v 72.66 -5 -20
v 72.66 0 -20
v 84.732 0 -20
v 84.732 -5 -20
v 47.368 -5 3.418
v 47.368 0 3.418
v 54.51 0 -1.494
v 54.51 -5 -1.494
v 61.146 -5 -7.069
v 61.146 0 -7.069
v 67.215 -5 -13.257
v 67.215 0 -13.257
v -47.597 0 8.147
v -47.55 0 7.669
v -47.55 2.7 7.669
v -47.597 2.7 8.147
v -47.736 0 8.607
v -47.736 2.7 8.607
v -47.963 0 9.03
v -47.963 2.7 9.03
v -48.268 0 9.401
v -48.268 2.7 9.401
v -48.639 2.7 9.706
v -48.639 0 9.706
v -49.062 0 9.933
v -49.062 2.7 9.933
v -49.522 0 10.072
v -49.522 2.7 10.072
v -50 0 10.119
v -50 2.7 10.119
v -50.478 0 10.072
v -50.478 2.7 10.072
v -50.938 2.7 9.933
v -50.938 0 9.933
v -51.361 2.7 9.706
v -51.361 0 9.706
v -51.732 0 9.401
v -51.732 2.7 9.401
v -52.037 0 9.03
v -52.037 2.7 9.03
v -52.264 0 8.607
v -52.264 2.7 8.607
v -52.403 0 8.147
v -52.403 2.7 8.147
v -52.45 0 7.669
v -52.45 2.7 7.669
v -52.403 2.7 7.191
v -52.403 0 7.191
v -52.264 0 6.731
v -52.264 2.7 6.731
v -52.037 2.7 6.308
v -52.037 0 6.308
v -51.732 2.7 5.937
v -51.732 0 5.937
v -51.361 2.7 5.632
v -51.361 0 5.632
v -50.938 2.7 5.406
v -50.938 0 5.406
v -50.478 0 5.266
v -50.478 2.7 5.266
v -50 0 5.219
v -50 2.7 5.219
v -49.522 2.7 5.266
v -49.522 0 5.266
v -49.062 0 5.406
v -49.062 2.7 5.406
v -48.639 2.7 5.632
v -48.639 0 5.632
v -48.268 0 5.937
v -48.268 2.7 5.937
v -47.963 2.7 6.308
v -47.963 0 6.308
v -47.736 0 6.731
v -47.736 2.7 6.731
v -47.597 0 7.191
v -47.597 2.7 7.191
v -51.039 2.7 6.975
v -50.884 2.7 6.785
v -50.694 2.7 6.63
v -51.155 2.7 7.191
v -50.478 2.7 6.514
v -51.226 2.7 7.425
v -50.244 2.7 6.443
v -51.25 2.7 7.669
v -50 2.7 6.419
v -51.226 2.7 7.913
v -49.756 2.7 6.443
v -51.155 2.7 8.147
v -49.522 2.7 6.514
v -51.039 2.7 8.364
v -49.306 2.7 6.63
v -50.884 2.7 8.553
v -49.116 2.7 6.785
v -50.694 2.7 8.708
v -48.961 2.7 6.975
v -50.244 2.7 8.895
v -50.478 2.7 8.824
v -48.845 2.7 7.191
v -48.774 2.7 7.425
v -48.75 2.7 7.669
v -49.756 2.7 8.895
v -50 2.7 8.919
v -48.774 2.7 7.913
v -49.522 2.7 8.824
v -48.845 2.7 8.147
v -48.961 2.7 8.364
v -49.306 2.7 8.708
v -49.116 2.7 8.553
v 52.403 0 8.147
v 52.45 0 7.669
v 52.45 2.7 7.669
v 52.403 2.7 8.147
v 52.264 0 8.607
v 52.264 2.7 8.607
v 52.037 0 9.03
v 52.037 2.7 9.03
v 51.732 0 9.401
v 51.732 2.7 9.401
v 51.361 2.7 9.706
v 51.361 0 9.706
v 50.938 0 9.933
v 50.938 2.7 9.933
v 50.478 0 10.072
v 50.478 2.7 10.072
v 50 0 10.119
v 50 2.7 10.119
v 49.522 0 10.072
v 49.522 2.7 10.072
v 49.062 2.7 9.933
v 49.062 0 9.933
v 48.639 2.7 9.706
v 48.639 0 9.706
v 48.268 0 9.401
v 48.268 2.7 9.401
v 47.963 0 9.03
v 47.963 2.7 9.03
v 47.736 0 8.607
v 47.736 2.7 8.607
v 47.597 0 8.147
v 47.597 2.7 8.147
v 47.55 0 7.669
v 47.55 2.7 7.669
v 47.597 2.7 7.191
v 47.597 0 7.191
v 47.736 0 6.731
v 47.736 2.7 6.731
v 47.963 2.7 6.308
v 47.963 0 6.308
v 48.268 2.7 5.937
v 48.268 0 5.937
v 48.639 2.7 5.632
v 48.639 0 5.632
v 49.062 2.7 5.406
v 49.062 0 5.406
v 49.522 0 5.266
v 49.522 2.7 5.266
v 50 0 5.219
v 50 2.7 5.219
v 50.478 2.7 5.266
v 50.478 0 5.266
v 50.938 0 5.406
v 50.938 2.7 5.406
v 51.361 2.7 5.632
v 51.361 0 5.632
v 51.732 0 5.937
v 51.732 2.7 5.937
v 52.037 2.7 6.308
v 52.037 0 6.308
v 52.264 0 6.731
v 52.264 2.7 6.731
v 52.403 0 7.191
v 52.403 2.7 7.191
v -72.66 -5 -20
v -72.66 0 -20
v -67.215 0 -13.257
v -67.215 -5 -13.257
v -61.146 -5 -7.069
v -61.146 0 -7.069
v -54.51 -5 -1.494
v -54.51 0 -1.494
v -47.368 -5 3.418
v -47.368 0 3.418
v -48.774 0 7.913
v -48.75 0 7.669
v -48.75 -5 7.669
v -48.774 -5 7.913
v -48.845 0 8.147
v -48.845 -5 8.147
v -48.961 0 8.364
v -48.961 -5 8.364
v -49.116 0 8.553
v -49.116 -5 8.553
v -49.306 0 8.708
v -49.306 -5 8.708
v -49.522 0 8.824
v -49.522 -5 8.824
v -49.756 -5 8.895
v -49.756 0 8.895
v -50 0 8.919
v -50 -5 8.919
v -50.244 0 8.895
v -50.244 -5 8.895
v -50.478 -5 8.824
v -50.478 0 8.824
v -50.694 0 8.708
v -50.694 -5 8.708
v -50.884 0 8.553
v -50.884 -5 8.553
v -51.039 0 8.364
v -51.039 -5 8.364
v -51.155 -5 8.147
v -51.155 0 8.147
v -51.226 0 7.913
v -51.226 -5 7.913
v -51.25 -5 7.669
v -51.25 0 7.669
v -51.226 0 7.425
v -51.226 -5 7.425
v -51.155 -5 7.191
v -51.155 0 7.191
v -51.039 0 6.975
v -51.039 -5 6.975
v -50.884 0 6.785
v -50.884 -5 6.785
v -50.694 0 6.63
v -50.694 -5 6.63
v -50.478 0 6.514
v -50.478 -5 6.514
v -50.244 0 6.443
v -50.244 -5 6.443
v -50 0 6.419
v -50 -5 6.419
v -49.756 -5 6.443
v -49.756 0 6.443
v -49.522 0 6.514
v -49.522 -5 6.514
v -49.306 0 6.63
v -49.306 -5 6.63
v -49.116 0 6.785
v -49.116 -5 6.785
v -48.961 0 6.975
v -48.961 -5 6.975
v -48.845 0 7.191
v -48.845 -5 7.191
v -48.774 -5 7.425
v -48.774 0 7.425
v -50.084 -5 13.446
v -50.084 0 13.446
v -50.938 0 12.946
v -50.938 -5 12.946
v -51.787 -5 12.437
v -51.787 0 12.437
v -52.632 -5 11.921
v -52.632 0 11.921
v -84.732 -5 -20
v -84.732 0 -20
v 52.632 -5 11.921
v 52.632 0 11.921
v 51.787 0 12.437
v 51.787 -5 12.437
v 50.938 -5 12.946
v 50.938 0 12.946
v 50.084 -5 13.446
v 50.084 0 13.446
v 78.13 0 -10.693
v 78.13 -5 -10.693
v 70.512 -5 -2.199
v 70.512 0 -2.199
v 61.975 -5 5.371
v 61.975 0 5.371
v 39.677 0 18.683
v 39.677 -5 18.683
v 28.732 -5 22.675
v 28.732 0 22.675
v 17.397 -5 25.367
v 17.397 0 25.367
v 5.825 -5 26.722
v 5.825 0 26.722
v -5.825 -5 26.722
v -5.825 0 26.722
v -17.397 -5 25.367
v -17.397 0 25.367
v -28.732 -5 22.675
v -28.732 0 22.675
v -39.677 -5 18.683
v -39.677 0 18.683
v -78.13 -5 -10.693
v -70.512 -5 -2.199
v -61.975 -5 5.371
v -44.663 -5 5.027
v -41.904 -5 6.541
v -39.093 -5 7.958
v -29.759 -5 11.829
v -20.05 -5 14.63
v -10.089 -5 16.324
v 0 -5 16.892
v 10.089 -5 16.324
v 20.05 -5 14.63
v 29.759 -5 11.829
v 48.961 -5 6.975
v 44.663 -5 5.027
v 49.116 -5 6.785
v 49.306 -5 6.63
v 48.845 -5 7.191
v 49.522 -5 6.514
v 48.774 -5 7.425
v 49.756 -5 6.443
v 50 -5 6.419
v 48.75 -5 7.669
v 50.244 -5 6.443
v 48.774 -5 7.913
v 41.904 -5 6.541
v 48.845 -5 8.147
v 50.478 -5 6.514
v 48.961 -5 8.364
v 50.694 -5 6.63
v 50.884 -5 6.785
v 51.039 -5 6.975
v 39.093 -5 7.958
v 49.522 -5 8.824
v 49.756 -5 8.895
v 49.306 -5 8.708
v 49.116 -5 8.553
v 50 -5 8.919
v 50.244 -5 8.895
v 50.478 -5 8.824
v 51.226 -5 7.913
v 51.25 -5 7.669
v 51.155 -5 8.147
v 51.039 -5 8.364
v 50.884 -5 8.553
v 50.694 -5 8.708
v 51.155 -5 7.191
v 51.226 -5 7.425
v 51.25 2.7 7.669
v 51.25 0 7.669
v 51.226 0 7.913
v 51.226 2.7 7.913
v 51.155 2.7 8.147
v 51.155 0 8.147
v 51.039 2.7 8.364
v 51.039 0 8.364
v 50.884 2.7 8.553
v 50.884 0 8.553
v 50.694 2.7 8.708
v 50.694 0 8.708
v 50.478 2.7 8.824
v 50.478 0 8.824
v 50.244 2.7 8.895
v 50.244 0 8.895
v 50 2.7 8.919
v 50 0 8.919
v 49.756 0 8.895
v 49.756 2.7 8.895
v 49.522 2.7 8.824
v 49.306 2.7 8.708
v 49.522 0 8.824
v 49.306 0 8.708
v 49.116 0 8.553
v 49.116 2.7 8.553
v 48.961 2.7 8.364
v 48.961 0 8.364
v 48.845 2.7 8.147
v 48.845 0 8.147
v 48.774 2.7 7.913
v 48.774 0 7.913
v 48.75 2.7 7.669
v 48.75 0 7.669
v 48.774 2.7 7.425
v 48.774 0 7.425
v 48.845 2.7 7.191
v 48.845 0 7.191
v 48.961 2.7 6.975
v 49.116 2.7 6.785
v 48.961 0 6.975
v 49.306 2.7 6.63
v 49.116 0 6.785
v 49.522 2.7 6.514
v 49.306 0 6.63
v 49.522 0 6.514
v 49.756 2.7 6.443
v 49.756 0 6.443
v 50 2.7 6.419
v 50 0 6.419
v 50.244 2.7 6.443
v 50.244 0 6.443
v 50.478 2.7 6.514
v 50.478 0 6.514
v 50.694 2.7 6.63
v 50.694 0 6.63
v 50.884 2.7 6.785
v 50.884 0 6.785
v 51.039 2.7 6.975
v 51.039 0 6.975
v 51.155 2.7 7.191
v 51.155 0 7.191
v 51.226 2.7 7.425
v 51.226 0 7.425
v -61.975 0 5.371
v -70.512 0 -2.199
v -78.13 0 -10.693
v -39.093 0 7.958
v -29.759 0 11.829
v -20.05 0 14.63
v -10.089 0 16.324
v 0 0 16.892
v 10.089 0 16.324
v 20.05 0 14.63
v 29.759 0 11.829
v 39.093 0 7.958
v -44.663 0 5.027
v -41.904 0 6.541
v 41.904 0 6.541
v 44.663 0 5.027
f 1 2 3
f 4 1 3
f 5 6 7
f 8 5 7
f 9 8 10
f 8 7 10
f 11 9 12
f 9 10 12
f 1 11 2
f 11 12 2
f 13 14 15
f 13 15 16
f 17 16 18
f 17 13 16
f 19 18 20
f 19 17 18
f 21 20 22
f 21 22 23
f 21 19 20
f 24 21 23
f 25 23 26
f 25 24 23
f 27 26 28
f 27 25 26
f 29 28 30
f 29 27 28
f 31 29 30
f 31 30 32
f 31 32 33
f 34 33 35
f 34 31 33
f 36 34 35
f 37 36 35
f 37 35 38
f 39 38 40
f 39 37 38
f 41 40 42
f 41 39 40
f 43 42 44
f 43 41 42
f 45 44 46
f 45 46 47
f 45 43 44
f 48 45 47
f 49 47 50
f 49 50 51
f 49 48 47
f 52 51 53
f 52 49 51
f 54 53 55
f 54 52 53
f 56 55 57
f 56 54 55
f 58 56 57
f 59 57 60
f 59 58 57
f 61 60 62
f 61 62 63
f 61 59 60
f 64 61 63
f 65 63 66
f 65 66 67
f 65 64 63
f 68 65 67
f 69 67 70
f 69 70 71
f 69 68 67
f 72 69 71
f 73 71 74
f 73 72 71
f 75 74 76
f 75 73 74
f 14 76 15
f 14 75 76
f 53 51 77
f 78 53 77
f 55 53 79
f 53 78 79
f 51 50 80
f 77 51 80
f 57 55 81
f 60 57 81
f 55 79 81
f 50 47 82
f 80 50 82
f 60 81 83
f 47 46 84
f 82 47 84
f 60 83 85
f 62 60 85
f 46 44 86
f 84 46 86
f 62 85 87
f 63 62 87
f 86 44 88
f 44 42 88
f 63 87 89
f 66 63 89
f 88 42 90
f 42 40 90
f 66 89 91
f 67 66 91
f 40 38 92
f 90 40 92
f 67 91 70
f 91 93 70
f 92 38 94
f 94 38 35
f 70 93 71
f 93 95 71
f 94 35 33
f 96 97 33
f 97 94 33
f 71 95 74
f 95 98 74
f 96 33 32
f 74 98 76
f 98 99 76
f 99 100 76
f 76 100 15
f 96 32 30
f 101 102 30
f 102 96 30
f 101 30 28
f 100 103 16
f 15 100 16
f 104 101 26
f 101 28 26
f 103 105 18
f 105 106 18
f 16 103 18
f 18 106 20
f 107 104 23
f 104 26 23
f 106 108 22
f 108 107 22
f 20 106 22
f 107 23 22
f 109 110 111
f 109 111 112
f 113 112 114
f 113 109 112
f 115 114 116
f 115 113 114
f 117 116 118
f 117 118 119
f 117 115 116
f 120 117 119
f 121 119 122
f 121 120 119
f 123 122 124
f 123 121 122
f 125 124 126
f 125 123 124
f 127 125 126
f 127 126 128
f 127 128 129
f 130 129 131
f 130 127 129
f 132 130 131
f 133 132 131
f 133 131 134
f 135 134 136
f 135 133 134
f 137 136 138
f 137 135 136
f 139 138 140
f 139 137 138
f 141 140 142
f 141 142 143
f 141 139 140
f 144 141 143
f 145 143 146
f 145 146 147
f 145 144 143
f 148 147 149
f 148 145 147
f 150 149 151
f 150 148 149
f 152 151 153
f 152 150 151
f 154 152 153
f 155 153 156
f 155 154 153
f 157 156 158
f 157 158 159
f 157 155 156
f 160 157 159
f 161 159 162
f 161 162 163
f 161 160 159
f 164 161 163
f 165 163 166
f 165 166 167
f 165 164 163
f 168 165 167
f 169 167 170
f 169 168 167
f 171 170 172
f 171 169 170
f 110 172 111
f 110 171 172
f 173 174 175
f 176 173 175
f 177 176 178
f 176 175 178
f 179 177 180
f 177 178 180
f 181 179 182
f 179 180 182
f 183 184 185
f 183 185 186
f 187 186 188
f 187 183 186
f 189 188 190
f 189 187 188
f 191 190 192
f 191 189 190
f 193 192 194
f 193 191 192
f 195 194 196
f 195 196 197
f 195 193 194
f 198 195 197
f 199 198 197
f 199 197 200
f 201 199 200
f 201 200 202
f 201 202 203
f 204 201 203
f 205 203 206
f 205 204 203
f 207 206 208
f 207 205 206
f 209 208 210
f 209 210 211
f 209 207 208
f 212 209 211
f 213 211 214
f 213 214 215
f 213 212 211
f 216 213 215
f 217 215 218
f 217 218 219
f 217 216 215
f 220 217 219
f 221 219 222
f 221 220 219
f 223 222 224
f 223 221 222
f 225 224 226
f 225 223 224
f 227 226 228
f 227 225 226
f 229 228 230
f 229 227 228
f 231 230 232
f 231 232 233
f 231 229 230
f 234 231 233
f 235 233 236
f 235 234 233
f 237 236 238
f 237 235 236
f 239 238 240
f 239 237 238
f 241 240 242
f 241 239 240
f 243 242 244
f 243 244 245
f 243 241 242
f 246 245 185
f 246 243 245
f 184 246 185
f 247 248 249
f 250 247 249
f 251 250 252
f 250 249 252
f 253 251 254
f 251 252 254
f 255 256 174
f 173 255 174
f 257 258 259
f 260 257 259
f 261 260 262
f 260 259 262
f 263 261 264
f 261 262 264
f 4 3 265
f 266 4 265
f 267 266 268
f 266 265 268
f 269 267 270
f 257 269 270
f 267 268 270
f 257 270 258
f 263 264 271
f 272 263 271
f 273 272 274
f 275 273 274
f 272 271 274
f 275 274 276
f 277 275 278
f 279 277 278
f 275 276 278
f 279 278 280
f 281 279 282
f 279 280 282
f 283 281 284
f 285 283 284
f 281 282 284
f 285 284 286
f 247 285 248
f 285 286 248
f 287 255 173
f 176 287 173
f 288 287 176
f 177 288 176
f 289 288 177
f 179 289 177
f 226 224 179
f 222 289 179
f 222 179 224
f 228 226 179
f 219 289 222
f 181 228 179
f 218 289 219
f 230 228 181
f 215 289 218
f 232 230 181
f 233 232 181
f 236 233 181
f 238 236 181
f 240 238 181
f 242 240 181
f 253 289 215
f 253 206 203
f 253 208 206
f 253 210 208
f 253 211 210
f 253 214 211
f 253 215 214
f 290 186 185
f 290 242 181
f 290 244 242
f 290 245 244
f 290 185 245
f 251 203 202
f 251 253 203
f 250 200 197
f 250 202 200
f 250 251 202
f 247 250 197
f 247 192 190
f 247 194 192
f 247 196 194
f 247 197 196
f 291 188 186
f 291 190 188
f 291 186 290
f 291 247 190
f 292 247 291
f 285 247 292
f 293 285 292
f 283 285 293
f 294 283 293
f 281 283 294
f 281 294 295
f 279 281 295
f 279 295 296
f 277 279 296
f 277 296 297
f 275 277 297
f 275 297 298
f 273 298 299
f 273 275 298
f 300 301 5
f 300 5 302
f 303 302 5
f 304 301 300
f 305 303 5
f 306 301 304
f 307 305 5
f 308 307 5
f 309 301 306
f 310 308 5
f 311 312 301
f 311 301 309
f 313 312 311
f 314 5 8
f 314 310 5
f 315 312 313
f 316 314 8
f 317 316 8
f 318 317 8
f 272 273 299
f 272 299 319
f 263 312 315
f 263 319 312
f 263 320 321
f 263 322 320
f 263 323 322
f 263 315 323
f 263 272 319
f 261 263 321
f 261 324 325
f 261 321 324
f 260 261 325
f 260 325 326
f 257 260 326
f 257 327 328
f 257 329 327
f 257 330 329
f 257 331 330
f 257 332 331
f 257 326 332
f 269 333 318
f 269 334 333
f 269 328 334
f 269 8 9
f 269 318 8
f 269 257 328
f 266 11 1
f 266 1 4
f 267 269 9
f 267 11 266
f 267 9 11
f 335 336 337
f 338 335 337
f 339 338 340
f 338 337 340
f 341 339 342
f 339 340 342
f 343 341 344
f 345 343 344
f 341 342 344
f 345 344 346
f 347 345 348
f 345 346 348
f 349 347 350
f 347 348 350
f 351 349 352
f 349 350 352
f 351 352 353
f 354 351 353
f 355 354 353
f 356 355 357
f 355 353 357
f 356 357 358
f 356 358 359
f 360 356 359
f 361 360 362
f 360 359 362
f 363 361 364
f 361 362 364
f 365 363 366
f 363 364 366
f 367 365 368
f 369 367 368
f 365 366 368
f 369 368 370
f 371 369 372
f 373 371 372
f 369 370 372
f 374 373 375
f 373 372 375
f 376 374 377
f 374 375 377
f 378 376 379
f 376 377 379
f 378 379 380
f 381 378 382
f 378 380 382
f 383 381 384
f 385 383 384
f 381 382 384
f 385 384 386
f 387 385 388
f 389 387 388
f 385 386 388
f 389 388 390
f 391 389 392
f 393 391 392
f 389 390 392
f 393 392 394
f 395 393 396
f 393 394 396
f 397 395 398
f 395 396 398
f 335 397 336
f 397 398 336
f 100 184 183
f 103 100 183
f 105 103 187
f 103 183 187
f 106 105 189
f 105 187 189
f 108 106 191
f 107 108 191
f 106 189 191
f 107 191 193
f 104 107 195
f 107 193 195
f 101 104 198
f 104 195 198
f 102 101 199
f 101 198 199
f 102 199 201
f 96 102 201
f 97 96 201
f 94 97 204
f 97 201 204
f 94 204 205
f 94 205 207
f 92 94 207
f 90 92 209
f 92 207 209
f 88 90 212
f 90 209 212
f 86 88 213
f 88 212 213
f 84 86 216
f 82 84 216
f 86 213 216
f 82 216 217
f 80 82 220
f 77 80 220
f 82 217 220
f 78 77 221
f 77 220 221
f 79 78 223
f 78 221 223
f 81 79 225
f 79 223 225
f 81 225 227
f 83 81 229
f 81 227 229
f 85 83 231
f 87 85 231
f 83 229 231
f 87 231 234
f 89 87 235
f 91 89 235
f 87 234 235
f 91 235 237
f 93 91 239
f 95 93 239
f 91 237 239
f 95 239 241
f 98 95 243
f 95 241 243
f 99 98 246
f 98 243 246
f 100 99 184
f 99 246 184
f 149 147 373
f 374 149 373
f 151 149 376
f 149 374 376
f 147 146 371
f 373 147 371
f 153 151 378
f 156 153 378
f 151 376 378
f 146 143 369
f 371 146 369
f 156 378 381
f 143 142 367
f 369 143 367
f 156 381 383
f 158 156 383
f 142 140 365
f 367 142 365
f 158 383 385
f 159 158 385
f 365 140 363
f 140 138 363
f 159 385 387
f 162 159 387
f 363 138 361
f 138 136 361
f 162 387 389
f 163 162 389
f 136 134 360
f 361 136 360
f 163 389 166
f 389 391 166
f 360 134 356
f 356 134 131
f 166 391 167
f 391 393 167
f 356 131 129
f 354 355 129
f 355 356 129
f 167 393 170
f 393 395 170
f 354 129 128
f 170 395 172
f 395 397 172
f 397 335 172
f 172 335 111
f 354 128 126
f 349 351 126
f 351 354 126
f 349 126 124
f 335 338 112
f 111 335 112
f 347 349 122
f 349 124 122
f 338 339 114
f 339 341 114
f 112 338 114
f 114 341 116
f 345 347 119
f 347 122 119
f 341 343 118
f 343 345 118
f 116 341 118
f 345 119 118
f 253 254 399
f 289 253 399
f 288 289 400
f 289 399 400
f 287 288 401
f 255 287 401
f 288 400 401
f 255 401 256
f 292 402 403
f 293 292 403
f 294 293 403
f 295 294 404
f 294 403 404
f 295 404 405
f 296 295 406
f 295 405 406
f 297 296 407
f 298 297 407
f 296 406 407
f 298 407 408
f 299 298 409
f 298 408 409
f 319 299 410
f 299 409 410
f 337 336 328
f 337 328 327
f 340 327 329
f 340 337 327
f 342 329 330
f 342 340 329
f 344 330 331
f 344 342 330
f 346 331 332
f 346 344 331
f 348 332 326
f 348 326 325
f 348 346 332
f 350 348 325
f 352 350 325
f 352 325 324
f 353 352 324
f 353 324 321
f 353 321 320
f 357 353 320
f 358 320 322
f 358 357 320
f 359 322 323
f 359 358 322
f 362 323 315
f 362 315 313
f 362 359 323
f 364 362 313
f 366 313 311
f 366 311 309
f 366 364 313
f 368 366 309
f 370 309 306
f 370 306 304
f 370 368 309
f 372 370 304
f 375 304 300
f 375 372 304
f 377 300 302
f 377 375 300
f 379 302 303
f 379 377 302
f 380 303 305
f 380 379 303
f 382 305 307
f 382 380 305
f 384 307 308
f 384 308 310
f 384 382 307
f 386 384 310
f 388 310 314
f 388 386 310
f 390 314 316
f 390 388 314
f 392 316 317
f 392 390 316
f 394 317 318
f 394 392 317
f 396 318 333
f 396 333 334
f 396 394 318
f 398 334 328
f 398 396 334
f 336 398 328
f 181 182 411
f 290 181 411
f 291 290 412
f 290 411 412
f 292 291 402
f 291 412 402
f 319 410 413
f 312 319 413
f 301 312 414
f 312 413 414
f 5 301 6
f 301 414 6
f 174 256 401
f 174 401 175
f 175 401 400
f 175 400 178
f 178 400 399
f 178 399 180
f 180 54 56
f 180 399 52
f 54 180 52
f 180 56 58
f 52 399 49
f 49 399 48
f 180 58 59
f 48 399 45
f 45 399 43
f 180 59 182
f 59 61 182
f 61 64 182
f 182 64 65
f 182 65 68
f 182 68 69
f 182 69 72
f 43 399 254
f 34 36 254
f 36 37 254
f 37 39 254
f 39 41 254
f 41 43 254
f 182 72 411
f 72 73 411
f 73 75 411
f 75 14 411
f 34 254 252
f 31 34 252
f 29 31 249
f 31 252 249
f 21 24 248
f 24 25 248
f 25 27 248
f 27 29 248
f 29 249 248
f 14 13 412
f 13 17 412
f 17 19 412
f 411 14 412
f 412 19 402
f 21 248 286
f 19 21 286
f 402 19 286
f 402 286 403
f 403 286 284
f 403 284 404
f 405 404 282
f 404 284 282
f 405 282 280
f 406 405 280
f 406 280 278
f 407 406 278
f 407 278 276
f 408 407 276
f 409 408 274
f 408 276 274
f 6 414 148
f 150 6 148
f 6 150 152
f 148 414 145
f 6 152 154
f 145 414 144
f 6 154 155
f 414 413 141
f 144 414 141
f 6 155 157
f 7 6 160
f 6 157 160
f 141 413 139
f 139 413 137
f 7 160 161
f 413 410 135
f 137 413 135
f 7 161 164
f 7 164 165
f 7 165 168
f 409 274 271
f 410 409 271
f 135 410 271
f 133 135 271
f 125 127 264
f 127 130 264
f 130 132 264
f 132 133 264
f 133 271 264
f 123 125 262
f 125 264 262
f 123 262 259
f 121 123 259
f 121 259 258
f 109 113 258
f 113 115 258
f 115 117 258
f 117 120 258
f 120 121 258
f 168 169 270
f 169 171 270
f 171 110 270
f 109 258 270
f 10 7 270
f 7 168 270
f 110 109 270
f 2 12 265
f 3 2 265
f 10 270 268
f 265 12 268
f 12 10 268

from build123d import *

# Parameters (mm, degrees)
F0_R     = 2.45
F0_R_2   = 1.25
F1_DEPTH = 5
F2_DEPTH = 2.7


with BuildPart() as f1:
    # F0 (on Front) → F1 (new body)
    with BuildSketch(Plane.XZ):
        with BuildLine():
            ThreePointArc((50.0836358252, 13.4458006649), (0, 26.8916013299), (-50.0836358252, 13.4458006649))
            ThreePointArc((-50.0836358252, 13.4458006649), (-48.8562145849, 12.7470900403), (-47.6190477051, 12.0657842722))
            ThreePointArc((-47.6190477051, 12.0657842722), (-43.4045903326, 9.9109244244), (-39.0928846634, 7.9579097983))
            ThreePointArc((-39.0928846634, 7.9579097983), (0, 16.8916013299), (39.0928846634, 7.9579097983))
            ThreePointArc((39.0928846634, 7.9579097983), (43.4045901471, 9.910924335), (47.6190473429, 12.0657840761))
            ThreePointArc((47.6190473429, 12.0657840761), (48.8562144052, 12.7470899397), (50.0836358252, 13.4458006649))
        make_face()
        with BuildLine():
            ThreePointArc((-47.3684207798, 3.4176277054), (-54.2514458754, 5.0374944493), (-52.6315787551, 11.9205194563))
            ThreePointArc((-52.6315787551, 11.9205194563), (-70.5117896256, -2.1993899068), (-84.7319183702, -20))
            Line((-84.7319183702, -20), (-72.6601540784, -20))
            ThreePointArc((-72.6601540784, -20), (-61.1458176612, -7.0690998963), (-47.3684207798, 3.4176277054))
        make_face()
        with BuildLine():
            ThreePointArc((84.7319183702, -20), (70.511789623, -2.1993899042), (52.6315787487, 11.9205194603))
            ThreePointArc((52.6315787487, 11.9205194603), (54.3679453833, 10.1023948559), (55, 7.6690734369))
            ThreePointArc((55, 7.6690734369), (52.4333212381, 3.3011279528), (47.3684208991, 3.4176276316))
            ThreePointArc((47.3684208991, 3.4176276316), (61.1458177127, -7.0690999439), (72.6601540784, -20))
            Line((72.6601540784, -20), (84.7319183702, -20))
        make_face()
        with BuildLine():
            ThreePointArc((-45, 7.6690734369), (-45.7043765601, 10.2279050575), (-47.6190477051, 12.0657842722))
            ThreePointArc((-47.6190477051, 12.0657842722), (-50.1448408517, 12.6669751094), (-52.6315787551, 11.9205194563))
            ThreePointArc((-52.6315787551, 11.9205194563), (-54.2514458754, 5.0374944493), (-47.3684207798, 3.4176277054))
            ThreePointArc((-47.3684207798, 3.4176277054), (-45.6320544817, 5.2357522601), (-45, 7.6690734369))
        make_face()
        with Locations((-50, 7.6690734369)):
            Circle(F0_R, mode=Mode.SUBTRACT)
        with BuildLine():
            ThreePointArc((52.6315787487, 11.9205194603), (50.1448406421, 12.6669751154), (47.6190473429, 12.0657840761))
            ThreePointArc((47.6190473429, 12.0657840761), (45.0020983275, 7.813914286), (47.3684208991, 3.4176276316))
            ThreePointArc((47.3684208991, 3.4176276316), (52.4333212381, 3.3011279528), (55, 7.6690734369))
            ThreePointArc((55, 7.6690734369), (54.3679453833, 10.1023948559), (52.6315787487, 11.9205194603))
        make_face()
        with Locations((50, 7.6690734369)):
            Circle(F0_R, mode=Mode.SUBTRACT)
        with BuildLine():
            ThreePointArc((-39.0928846634, 7.9579097983), (-43.4045903326, 9.9109244244), (-47.6190477051, 12.0657842722))
            ThreePointArc((-47.6190477051, 12.0657842722), (-45.7043765601, 10.2279050575), (-45, 7.6690734369))
            ThreePointArc((-45, 7.6690734369), (-45.6320544817, 5.2357522601), (-47.3684207798, 3.4176277054))
            ThreePointArc((-47.3684207798, 3.4176277054), (-43.2902168521, 5.7963358196), (-39.0928846634, 7.9579097983))
        make_face()
        with BuildLine():
            ThreePointArc((47.3684208991, 3.4176276316), (45.0020983275, 7.813914286), (47.6190473429, 12.0657840761))
            ThreePointArc((47.6190473429, 12.0657840761), (43.4045901471, 9.910924335), (39.0928846634, 7.9579097983))
            ThreePointArc((39.0928846634, 7.9579097983), (43.2902169136, 5.7963357859), (47.3684208991, 3.4176276316))
        make_face()
        with Locations((-50, 7.6690734369)):
            Circle(F0_R)
        with Locations((-50, 7.6690734369)):
            Circle(F0_R_2, mode=Mode.SUBTRACT)
        with Locations((50, 7.6690734369)):
            Circle(F0_R)
        with Locations((50, 7.6690734369)):
            Circle(F0_R_2, mode=Mode.SUBTRACT)
        with BuildLine():
            ThreePointArc((-47.6190477051, 12.0657842722), (-48.8562145849, 12.7470900403), (-50.0836358252, 13.4458006649))
            ThreePointArc((-50.0836358252, 13.4458006649), (-51.363269437, 12.692618531), (-52.6315787551, 11.9205194563))
            ThreePointArc((-52.6315787551, 11.9205194563), (-50.1448408517, 12.6669751094), (-47.6190477051, 12.0657842722))
        make_face()
        with BuildLine():
            ThreePointArc((52.6315787487, 11.9205194603), (51.3632694338, 12.6926185329), (50.0836358252, 13.4458006649))
            ThreePointArc((50.0836358252, 13.4458006649), (48.8562144052, 12.7470899397), (47.6190473429, 12.0657840761))
            ThreePointArc((47.6190473429, 12.0657840761), (50.1448406421, 12.6669751154), (52.6315787487, 11.9205194603))
        make_face()
    extrude(amount=F1_DEPTH)

    # F0 (on Front) → F2 (join)
    with BuildSketch(Plane.XZ):
        with Locations((50, 7.6690734369)):
            Circle(F0_R)
        with Locations((50, 7.6690734369)):
            Circle(F0_R_2, mode=Mode.SUBTRACT)
        with Locations((-50, 7.6690734369)):
            Circle(F0_R)
        with Locations((-50, 7.6690734369)):
            Circle(F0_R_2, mode=Mode.SUBTRACT)
    extrude(amount=-F2_DEPTH)


solid = f1.part
